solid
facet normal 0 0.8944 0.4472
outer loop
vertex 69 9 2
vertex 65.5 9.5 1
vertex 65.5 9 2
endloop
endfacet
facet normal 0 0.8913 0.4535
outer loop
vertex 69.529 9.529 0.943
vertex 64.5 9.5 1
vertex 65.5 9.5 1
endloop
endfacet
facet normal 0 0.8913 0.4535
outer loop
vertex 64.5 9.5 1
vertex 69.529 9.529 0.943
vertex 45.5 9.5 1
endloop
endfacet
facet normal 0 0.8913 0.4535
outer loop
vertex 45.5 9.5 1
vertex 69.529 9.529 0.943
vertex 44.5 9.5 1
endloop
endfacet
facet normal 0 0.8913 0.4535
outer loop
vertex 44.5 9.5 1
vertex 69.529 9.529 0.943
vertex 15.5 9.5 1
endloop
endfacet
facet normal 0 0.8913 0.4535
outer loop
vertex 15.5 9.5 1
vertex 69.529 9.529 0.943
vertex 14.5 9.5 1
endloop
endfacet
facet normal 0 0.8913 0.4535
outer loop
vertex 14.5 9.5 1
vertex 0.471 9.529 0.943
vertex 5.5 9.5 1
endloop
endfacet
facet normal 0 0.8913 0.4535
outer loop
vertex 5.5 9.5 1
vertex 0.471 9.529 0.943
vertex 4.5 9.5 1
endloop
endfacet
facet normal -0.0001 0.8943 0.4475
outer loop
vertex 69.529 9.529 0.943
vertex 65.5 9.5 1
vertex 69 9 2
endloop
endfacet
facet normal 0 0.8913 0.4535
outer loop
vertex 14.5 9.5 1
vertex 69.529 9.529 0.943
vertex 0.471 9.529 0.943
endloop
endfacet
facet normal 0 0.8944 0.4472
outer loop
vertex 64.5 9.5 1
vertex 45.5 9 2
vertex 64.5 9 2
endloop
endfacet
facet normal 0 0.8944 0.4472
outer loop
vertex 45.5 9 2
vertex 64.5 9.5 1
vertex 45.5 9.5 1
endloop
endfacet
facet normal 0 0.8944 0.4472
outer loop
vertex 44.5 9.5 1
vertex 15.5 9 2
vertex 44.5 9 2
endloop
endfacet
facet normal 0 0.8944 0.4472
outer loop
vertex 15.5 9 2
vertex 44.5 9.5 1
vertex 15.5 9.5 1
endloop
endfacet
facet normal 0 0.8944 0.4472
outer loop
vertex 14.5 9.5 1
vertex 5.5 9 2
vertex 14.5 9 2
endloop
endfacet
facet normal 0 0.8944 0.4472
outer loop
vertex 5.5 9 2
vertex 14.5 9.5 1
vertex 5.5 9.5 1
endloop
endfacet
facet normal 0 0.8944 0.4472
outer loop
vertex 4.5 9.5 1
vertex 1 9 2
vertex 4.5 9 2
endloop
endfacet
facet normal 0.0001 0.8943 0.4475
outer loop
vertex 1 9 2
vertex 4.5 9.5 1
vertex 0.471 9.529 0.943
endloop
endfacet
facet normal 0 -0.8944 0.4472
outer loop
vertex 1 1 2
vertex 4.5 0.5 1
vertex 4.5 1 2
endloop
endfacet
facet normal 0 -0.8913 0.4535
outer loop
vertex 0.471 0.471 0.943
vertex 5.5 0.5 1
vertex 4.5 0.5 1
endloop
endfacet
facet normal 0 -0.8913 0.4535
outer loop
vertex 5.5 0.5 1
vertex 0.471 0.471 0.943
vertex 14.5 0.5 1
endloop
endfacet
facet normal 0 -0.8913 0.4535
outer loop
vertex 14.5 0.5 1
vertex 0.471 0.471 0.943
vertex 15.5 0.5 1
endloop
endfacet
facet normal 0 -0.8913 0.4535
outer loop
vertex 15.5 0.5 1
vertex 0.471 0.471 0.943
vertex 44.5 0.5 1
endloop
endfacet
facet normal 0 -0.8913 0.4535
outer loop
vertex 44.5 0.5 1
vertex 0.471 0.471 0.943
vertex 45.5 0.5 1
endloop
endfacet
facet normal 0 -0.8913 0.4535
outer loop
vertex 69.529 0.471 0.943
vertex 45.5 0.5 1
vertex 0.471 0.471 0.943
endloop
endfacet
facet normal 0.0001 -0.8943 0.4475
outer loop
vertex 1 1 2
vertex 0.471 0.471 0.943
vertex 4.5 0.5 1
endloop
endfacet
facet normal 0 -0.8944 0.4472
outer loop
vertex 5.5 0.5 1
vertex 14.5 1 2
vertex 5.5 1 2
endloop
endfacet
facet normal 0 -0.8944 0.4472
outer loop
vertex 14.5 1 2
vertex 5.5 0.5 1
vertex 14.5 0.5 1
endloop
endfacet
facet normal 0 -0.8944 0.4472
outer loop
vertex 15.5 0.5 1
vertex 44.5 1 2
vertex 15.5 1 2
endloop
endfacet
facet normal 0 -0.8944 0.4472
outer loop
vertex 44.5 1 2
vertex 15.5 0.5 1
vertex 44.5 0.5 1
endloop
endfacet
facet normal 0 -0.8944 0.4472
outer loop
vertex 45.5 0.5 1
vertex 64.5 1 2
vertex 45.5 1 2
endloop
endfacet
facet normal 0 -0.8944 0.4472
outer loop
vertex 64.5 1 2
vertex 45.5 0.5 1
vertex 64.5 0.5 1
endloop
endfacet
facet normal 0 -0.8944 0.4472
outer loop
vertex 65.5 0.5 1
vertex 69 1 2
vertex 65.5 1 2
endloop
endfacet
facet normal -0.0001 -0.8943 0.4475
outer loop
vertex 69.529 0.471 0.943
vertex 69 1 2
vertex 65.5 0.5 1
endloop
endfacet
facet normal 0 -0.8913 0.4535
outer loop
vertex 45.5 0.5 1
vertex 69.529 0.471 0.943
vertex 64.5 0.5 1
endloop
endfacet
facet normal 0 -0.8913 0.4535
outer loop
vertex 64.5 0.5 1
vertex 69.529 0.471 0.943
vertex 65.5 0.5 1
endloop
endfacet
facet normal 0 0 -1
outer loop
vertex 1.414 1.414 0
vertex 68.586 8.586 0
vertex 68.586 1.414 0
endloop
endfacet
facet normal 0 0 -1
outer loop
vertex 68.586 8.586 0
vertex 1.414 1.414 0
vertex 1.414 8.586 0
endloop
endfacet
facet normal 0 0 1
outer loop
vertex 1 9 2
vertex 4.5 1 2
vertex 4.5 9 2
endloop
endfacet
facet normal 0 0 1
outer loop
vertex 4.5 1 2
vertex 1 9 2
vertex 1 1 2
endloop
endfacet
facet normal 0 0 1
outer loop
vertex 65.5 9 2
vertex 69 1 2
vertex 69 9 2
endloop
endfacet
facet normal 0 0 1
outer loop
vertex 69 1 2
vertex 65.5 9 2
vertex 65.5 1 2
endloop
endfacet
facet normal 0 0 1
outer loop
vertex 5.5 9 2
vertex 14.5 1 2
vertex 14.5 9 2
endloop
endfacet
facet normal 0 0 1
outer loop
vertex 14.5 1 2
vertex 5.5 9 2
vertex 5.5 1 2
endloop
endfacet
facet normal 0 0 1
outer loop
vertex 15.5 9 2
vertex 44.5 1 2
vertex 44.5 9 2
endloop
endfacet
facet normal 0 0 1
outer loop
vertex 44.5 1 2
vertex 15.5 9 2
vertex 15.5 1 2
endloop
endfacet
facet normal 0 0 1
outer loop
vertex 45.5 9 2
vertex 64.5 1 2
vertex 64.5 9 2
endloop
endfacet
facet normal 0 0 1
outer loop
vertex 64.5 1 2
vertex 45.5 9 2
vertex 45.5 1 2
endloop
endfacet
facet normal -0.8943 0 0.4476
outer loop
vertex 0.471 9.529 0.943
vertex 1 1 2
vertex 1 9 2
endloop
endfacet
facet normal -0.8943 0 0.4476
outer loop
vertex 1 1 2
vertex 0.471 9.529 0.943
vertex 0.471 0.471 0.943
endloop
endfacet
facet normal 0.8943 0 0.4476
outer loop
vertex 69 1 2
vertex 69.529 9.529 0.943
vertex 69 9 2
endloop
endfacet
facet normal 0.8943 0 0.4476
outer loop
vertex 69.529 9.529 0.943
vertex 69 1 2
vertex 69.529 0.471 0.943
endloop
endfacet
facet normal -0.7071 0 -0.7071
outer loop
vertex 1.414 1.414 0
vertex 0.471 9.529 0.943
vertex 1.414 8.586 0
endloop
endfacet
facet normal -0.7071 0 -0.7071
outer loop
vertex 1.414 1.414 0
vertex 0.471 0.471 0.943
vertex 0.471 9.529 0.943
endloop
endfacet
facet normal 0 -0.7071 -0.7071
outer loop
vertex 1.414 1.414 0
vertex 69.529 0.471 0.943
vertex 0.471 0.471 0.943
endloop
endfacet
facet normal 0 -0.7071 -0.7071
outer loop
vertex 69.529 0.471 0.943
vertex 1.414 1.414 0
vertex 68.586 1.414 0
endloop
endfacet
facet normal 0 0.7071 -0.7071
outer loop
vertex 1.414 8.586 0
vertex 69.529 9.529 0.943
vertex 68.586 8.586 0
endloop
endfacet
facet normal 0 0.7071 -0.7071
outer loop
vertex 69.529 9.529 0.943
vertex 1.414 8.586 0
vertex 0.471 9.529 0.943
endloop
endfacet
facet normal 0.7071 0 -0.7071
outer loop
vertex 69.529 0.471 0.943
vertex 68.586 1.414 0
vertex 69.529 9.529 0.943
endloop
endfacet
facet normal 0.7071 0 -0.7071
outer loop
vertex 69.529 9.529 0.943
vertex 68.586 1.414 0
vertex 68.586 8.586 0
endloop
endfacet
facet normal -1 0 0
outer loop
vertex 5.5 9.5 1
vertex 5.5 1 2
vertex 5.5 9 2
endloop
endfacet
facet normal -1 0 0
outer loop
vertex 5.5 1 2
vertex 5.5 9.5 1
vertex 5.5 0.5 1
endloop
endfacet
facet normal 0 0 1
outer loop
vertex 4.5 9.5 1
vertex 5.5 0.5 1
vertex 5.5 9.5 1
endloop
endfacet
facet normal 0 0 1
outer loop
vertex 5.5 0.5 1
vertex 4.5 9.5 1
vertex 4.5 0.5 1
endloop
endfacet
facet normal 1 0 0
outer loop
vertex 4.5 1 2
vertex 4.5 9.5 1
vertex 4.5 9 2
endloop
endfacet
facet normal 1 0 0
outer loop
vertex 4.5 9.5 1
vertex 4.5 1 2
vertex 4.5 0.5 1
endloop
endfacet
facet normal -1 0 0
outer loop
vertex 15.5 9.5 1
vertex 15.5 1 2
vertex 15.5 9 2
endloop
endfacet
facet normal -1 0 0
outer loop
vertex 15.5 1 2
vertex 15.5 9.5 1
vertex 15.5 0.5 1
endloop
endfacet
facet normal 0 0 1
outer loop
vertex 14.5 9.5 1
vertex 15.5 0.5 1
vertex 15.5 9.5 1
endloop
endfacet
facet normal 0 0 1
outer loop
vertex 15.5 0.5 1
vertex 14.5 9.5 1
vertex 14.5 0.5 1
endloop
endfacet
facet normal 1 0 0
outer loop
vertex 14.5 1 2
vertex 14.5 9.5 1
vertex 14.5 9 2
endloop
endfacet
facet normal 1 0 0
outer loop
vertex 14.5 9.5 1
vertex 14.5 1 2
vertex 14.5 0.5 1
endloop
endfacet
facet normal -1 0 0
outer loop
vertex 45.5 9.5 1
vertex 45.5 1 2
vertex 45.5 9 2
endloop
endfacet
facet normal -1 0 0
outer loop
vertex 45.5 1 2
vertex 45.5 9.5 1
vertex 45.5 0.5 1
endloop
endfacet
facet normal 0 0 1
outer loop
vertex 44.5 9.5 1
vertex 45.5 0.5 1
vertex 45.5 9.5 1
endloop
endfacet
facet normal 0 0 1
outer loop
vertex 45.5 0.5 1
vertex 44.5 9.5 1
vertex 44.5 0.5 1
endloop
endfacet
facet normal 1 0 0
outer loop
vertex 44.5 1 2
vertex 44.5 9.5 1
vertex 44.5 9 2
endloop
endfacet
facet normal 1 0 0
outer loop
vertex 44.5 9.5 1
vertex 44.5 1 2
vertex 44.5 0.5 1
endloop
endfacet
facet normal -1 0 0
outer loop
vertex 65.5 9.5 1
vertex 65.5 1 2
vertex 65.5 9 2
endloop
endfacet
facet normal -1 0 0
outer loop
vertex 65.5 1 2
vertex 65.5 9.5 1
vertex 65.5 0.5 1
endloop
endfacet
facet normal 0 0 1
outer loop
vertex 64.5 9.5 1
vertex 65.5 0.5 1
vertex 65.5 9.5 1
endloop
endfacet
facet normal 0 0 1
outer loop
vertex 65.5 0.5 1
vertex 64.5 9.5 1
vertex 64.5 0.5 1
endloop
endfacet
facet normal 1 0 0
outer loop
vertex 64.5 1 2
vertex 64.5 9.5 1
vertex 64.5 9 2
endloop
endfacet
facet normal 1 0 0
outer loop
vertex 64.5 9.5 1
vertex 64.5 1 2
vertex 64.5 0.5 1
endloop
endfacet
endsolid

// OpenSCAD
tick_positions = [0,1,4,6];
unit = 10;  // Unit of length between ticks
length = unit*max(tick_positions); // maximum length measured by the ruler
margin = 5; // spare room at each end of the ruler
width = 10; // width of the ruler
height = 2; // height of the ruler
taper = 1;  // thickness of the taper on the top
tick_width = 1; // width of the ticks
tick_depth = 1; // depth of the ticks
lip = 1;    // thickness of the taper on the bottom

in = true;  // if true, render the ruler with gaps for the ticks. If false, render just the ticks


module base() {
    d = sqrt(taper*taper+height*height);
    an = atan2(height,taper);
    tlength = length+2*margin;
    
    difference() {
        rotate([90,0,90])
            linear_extrude(tlength)
            polygon([
                [0,0],
                [width,0],
                [width-taper,height],
                [taper,height]
            ]);
    
        rotate([0,-an,0]) translate([0,0,0]) scale([d,width,height]) cube();
        scale([-1,1,1]) translate([-tlength,0,0]) rotate([0,-an,0]) translate([0,0,0]) scale([d,width,d]) cube();
        rotate([0,45,0]) translate([-lip,0,0]) scale([2*lip,width,lip]) cube(center=false);
        rotate([-45,0,0]) translate([0,-lip,0]) scale([tlength,2*lip,lip]) cube(center=false);
        translate([0,width,0]) rotate([45,0,0]) translate([0,-lip,]) scale([tlength,2*lip,lip]) cube(center=false);
        translate([tlength,0,0]) rotate([0,-45,0]) translate([-lip,0,0]) scale([2*lip,width,lip]) cube(center=false);
    }
}

module tick(x) {
    translate([unit*x+margin,width/2,height-tick_depth/2])
    scale([tick_width, width, tick_depth]) 
    #cube(center=true);
}
module ticks() {
    for(x=tick_positions) {
        tick(x);
    }
}

if(in) {
    difference() {
        base();
        ticks();
    }
} else {
    intersection() {
        base();
        ticks();
    }
}
